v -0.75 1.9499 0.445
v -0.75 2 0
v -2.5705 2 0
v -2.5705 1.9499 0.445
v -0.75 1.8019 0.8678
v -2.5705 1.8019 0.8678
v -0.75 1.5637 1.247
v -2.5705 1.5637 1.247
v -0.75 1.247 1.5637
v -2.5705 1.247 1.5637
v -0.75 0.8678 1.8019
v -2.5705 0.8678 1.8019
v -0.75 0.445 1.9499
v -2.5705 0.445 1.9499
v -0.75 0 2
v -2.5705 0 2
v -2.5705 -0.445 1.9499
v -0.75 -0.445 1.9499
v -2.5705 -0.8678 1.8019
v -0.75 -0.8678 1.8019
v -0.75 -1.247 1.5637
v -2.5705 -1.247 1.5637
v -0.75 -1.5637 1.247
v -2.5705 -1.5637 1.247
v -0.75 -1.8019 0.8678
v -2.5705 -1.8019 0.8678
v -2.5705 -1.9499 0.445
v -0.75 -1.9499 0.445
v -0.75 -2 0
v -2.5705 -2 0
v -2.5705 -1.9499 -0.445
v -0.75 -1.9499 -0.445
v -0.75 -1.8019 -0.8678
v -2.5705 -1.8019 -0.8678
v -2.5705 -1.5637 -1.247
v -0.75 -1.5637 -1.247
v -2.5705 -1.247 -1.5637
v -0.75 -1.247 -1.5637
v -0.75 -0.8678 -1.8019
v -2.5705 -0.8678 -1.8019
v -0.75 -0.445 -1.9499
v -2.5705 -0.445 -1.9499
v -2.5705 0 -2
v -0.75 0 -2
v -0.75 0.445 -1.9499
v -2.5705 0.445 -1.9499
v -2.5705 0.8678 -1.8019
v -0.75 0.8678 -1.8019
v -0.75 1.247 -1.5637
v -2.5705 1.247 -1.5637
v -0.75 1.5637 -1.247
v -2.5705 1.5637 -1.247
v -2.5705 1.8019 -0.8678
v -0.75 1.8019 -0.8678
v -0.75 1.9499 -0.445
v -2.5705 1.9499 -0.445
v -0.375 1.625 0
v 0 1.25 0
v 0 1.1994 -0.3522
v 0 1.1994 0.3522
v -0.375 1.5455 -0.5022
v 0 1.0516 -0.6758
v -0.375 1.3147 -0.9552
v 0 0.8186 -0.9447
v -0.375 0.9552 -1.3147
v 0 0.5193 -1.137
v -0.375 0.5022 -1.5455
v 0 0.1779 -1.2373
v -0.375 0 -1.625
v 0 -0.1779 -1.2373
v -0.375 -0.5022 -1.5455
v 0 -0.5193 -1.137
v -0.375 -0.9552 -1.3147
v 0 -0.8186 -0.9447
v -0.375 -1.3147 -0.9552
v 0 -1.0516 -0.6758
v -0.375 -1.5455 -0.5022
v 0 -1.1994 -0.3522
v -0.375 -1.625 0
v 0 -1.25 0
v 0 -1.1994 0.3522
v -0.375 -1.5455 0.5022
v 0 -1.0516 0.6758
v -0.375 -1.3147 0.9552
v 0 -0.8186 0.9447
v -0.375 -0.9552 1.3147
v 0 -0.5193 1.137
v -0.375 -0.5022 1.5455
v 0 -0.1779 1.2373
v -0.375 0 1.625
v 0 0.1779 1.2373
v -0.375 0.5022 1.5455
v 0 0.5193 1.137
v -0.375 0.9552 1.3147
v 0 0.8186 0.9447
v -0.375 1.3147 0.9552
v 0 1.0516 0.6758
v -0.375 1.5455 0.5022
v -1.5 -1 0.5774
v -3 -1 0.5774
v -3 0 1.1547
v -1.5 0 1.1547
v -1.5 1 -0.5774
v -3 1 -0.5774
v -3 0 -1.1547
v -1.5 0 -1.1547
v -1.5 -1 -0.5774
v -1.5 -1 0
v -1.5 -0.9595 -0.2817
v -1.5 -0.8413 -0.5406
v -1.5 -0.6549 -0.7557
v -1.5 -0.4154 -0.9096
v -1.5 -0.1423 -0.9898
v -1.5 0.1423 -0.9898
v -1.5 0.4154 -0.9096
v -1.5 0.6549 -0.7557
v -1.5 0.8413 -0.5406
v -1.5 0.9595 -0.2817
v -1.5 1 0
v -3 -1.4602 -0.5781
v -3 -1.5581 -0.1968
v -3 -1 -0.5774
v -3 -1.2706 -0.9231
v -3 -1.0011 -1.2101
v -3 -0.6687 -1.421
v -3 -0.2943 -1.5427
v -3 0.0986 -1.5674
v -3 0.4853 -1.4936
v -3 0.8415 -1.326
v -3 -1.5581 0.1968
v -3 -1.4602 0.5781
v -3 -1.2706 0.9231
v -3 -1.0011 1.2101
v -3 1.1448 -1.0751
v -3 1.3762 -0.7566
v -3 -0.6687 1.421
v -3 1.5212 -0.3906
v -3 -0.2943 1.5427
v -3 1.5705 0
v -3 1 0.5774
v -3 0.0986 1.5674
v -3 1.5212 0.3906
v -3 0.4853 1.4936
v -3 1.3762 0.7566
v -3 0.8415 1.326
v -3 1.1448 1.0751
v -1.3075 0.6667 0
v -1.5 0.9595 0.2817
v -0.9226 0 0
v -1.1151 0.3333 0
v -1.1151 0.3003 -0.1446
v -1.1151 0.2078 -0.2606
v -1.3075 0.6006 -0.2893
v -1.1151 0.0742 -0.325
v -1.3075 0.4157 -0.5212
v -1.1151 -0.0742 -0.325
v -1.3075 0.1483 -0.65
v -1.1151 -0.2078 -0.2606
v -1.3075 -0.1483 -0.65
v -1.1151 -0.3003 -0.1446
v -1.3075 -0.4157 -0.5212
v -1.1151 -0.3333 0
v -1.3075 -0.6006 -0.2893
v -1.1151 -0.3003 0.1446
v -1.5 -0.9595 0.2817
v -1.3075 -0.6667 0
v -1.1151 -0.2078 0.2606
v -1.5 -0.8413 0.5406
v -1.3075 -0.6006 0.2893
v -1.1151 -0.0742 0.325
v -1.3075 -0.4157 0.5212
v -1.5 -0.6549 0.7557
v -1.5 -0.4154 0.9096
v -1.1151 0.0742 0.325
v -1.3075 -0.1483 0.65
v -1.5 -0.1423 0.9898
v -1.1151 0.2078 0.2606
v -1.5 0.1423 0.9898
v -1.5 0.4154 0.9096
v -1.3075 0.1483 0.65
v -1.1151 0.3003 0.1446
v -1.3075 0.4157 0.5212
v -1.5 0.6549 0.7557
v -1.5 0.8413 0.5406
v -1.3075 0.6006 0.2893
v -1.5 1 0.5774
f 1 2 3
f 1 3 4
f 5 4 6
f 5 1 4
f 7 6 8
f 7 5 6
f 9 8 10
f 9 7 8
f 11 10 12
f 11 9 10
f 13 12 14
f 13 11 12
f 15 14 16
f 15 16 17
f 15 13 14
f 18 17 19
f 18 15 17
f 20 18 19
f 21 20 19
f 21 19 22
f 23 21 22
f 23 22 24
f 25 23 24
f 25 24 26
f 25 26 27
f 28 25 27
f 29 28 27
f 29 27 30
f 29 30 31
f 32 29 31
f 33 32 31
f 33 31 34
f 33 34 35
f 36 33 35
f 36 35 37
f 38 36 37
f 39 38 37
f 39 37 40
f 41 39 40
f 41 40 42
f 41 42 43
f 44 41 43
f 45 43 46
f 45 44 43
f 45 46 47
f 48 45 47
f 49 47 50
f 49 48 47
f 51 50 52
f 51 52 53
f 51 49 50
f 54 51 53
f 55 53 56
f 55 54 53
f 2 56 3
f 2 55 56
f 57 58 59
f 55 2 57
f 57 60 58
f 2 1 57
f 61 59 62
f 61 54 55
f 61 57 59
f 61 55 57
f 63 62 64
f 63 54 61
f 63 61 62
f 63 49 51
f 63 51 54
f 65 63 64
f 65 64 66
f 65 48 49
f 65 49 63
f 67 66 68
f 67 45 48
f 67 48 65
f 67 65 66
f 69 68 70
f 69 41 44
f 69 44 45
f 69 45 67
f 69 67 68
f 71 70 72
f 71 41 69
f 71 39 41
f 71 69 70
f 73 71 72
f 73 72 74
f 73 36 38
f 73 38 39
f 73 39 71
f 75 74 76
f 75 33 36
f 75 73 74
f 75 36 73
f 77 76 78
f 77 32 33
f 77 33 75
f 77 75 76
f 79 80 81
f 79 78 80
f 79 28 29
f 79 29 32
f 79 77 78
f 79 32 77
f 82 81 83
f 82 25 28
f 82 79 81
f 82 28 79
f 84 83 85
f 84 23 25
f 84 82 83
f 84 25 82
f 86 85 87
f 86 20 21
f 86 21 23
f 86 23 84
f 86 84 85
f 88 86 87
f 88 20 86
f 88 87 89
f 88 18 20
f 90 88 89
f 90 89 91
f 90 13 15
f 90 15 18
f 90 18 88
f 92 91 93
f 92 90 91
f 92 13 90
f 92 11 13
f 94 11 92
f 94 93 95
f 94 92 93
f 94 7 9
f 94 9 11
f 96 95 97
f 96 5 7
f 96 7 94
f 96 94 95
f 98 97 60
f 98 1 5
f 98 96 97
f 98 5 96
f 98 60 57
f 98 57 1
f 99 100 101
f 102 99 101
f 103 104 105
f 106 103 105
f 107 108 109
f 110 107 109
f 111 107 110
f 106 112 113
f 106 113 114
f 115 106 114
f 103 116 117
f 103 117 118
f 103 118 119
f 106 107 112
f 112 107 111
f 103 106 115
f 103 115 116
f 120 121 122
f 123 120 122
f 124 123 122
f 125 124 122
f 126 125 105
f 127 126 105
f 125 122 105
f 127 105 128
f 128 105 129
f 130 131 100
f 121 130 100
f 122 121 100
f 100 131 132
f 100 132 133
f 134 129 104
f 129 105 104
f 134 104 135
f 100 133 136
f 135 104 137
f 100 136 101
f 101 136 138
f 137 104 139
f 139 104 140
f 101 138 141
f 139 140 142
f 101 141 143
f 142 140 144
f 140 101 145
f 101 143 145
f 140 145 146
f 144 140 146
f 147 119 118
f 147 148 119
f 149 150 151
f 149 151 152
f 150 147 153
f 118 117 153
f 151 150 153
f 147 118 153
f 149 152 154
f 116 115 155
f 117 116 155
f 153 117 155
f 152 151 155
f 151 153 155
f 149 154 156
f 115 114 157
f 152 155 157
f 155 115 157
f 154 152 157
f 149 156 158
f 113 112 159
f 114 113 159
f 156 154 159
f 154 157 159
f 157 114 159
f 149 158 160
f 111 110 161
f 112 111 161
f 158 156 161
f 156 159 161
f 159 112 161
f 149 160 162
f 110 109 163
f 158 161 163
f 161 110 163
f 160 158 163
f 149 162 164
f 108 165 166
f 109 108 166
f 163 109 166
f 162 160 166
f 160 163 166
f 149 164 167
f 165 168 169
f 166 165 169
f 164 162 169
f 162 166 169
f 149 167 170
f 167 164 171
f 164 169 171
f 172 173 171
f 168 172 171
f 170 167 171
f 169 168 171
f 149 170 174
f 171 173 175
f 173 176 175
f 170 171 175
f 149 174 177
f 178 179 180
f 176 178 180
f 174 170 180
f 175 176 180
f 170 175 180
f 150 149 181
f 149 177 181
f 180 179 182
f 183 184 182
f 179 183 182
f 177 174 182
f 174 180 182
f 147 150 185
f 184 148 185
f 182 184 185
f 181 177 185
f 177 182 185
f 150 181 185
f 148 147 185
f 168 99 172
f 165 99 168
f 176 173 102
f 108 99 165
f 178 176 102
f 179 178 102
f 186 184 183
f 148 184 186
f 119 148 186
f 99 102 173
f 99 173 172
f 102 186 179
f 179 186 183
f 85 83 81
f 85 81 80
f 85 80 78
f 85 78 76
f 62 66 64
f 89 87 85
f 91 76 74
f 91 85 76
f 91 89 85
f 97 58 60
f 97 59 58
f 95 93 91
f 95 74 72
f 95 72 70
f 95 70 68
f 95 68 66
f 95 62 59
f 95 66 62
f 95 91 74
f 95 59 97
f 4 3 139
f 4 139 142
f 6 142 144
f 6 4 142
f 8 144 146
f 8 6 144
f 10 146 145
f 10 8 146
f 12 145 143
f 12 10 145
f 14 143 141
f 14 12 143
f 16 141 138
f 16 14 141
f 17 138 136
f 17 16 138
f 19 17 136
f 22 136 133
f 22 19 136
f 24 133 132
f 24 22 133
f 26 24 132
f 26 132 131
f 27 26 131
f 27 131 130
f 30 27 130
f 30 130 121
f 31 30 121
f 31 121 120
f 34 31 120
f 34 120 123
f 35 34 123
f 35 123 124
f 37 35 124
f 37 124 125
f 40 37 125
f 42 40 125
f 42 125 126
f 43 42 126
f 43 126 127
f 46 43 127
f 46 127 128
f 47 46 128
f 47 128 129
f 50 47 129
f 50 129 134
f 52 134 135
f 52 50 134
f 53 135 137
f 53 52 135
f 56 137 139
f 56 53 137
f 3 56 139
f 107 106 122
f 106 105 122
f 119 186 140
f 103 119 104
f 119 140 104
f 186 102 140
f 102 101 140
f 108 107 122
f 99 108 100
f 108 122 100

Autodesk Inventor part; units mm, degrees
sketch "Sketch_1" plane through (0, 0, 0) normal (0, 0, 1) x (1, 0, 0)
  line L0 (0, 0) -> (-3, 0)
  line L1 (-3, 0) -> (-3, 1.5705)
  line L2 (-3, 1.5705) -> (-2.5705, 2)
  line L3 (-2.5705, 2) -> (-0.75, 2)
  line L4 (-0.75, 2) -> (0, 1.25)
  line L5 (0, 1.25) -> (0, 0)
  line L6 (0, 0) -> (-3, 0)
revolve "Revolution1" add sketch "Sketch_1" angle 360 about axis through (0, 0, 0) along (1, 0, 0)
thread "Thread1" size "M4x0.7" class "6g" standard "ISO Metric profile" full length
sketch "Sketch_2" plane through (-3, 0, 0) normal (-1, 0, 0) x (0, 1, 0)
  line L0 (-1, 0.5774) -> (-1, -0.5774)
  line L1 (-1, -0.5774) -> (0, -1.1547)
  line L2 (0, -1.1547) -> (1, -0.5774)
  line L3 (1, -0.5774) -> (1, 0.5774)
  line L4 (1, 0.5774) -> (0, 1.1547)
  line L5 (0, 1.1547) -> (-1, 0.5774)
extrude "Extrusion1" cut sketch "Sketch_2" against normal blind 1.5
sketch "Sketch_3" plane through (0, 0, 0) normal (0, 0, 1) x (1, 0, 0)
  line L0 (-0.9226, 0) -> (-1.5, 0)
  line L1 (-1.5, 0) -> (-1.5, 1)
  line L2 (-1.5, 1) -> (-0.9226, 0)
  line L3 (-0.9226, 0) -> (-1.5, 0)
revolve "Revolution2" cut sketch "Sketch_3" angle 360 about axis through (-0.9226, 0, 0) along (1, 0, 0)
ref_plane "CP_XY" through (0, 0, 0) normal (1, 0, 0) x (0, 0, -1)
ref_plane "CP_YZ" through (0, 0, 0) normal (0, 0, -1) x (0, 1, 0)
ref_plane "CP_ZX" through (0, 0, 0) normal (0, 1, 0) x (1, 0, 0)
properties part number "SET-SCREW4-3"
